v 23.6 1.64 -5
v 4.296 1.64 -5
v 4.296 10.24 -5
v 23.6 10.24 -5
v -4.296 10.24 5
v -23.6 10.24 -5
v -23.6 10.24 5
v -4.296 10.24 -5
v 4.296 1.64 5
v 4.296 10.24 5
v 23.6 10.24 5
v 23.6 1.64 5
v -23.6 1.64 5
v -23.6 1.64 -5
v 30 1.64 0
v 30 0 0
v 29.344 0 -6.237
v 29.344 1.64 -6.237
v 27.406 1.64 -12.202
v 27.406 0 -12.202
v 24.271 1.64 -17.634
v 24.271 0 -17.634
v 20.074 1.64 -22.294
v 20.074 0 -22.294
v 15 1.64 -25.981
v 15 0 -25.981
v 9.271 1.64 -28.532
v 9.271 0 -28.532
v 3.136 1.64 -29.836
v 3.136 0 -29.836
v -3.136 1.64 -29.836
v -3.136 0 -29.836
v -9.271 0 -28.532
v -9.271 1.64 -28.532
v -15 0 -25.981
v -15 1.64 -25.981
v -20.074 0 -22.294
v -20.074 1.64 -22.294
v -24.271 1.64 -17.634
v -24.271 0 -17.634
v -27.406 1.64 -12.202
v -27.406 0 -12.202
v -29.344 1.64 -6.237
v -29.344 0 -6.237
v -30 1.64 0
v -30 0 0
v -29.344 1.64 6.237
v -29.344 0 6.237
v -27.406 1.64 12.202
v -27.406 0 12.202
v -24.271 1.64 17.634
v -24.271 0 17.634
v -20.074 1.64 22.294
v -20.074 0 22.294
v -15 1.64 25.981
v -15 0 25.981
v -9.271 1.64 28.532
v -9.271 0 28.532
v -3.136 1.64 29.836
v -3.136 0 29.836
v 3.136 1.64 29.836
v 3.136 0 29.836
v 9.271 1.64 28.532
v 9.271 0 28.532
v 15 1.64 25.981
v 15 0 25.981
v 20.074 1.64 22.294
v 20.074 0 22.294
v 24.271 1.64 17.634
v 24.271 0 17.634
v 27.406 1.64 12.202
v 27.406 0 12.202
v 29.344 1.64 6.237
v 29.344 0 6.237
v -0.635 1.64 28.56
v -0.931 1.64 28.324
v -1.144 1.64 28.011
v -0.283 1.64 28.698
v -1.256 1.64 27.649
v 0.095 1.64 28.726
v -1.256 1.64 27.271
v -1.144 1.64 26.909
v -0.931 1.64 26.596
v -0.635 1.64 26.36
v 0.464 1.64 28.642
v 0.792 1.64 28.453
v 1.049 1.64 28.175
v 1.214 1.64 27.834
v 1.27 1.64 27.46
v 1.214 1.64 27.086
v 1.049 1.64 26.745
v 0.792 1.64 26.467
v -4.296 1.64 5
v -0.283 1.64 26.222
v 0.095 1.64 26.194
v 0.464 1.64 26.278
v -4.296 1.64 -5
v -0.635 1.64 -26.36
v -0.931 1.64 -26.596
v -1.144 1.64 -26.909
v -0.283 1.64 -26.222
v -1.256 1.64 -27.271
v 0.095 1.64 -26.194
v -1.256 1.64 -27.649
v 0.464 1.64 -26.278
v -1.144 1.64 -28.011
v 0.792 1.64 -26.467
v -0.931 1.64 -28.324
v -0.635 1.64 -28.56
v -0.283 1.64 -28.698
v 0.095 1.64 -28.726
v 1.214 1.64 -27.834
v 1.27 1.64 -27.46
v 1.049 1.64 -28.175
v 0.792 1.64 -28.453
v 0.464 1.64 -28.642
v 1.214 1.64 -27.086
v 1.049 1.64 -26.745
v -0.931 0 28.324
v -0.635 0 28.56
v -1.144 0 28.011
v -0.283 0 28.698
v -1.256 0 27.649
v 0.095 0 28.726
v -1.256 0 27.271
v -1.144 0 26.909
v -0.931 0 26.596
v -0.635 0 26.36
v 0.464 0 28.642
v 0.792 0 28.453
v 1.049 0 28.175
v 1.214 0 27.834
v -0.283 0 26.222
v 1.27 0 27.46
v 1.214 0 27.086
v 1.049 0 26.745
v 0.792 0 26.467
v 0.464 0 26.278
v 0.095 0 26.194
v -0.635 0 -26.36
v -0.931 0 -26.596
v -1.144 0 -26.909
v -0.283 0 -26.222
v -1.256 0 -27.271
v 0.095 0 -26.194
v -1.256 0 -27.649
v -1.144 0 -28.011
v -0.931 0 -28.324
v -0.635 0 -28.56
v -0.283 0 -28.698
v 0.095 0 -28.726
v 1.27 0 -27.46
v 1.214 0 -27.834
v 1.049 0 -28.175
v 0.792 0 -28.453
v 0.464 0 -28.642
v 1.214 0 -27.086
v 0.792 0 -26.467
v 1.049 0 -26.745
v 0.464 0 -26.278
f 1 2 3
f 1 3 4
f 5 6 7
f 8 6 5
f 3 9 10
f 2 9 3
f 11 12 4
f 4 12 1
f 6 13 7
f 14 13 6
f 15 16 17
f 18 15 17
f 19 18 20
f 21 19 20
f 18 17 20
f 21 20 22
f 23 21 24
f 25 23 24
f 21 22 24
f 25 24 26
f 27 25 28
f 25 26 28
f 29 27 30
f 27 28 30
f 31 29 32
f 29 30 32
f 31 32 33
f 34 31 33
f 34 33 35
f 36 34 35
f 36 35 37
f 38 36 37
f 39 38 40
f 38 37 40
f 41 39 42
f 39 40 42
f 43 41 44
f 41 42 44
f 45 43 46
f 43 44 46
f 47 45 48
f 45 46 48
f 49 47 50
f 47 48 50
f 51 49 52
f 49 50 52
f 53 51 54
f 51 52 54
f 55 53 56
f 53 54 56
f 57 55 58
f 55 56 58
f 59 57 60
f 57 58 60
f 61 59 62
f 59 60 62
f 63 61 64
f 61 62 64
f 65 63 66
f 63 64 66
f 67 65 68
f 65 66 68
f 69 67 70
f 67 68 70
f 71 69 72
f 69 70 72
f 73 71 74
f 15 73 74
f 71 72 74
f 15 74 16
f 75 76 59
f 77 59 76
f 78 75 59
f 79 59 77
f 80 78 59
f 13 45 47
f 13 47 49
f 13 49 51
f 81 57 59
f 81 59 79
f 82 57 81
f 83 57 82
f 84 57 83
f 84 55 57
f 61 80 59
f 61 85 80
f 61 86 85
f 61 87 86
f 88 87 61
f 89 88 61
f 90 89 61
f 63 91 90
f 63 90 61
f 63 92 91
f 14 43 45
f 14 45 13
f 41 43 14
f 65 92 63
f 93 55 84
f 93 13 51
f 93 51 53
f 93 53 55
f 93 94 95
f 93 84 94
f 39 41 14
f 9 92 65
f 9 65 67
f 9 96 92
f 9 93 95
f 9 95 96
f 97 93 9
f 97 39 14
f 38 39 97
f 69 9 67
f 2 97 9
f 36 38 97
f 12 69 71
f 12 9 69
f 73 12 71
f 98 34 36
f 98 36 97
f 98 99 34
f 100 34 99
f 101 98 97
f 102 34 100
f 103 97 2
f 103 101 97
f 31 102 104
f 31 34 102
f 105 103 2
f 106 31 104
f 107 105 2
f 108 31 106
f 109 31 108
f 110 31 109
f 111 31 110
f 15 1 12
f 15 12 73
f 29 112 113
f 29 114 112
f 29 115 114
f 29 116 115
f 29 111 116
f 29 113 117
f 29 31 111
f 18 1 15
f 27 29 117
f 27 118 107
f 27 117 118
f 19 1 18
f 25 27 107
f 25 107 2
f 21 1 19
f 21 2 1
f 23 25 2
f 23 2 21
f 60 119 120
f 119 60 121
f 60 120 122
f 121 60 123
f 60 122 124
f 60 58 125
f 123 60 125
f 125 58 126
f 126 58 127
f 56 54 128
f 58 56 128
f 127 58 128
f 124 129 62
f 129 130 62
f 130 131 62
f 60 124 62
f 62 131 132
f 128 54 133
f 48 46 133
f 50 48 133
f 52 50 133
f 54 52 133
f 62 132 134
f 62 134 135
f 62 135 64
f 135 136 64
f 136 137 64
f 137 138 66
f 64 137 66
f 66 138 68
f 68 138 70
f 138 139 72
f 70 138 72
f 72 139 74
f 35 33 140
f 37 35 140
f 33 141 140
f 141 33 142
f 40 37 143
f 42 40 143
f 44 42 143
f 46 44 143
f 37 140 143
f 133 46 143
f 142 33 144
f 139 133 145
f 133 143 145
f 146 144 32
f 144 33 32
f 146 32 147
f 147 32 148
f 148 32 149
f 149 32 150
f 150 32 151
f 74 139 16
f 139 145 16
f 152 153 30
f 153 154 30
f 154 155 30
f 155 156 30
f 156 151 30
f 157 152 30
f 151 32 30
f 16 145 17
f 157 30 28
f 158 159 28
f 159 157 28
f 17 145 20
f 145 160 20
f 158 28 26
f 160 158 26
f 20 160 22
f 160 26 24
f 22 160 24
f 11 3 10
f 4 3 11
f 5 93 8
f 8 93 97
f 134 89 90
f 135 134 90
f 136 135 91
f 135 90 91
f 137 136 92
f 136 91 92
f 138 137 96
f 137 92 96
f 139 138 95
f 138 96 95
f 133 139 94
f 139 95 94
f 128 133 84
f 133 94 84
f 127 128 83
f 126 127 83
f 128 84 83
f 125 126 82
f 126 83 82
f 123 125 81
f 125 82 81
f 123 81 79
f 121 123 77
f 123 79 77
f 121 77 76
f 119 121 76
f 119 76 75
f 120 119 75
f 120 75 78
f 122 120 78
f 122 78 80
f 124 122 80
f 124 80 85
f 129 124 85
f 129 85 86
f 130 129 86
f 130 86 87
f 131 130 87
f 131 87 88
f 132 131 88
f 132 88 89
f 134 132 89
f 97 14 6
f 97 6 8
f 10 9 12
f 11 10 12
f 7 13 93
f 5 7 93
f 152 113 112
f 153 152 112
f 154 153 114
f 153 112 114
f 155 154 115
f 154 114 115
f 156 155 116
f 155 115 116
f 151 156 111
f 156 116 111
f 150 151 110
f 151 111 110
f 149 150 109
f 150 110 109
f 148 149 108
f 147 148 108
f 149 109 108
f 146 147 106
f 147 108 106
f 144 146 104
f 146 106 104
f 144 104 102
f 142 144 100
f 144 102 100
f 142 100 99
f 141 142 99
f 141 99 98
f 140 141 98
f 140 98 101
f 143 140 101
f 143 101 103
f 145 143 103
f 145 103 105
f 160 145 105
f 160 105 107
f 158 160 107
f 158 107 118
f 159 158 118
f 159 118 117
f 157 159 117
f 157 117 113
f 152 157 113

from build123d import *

# Parameters (mm, degrees)
SKETCH1_R           = 30
BOSS_EXTRUDE1_DEPTH = 1.64
SKETCH2_R           = 1.27
CUT_EXTRUDE1_DEPTH  = 2.64
SKETCH3_W           = 19.304
SKETCH3_H           = 10
BOSS_EXTRUDE2_DEPTH = 8.6


with BuildPart() as part:
    # Sketch1 → Boss-Extrude1 (new body)
    with BuildSketch(Plane(origin=(0, 0, 0), x_dir=(1, 0, 0), z_dir=(0, 1, 0))):
        Circle(SKETCH1_R)
    extrude(amount=BOSS_EXTRUDE1_DEPTH)

    # Sketch2 → Cut-Extrude1 (cut, through all)
    with BuildSketch(Plane(origin=(0, 1.64, 0), x_dir=(1, 0, 0), z_dir=(0, 1, 0))):
        with Locations((0, 27.46)):
            Circle(SKETCH2_R)
        with Locations((0, -27.46)):
            Circle(SKETCH2_R)
    extrude(amount=-CUT_EXTRUDE1_DEPTH, mode=Mode.SUBTRACT)

    # Sketch3 → Boss-Extrude2 (add)
    with BuildSketch(Plane(origin=(0, 1.64, 0), x_dir=(1, 0, 0), z_dir=(0, 1, 0))):
        with Locations((-13.948, 0)):
            Rectangle(SKETCH3_W, SKETCH3_H)
        with Locations((13.948, 0)):
            Rectangle(SKETCH3_W, SKETCH3_H)
    extrude(amount=BOSS_EXTRUDE2_DEPTH)


solid = part.part
